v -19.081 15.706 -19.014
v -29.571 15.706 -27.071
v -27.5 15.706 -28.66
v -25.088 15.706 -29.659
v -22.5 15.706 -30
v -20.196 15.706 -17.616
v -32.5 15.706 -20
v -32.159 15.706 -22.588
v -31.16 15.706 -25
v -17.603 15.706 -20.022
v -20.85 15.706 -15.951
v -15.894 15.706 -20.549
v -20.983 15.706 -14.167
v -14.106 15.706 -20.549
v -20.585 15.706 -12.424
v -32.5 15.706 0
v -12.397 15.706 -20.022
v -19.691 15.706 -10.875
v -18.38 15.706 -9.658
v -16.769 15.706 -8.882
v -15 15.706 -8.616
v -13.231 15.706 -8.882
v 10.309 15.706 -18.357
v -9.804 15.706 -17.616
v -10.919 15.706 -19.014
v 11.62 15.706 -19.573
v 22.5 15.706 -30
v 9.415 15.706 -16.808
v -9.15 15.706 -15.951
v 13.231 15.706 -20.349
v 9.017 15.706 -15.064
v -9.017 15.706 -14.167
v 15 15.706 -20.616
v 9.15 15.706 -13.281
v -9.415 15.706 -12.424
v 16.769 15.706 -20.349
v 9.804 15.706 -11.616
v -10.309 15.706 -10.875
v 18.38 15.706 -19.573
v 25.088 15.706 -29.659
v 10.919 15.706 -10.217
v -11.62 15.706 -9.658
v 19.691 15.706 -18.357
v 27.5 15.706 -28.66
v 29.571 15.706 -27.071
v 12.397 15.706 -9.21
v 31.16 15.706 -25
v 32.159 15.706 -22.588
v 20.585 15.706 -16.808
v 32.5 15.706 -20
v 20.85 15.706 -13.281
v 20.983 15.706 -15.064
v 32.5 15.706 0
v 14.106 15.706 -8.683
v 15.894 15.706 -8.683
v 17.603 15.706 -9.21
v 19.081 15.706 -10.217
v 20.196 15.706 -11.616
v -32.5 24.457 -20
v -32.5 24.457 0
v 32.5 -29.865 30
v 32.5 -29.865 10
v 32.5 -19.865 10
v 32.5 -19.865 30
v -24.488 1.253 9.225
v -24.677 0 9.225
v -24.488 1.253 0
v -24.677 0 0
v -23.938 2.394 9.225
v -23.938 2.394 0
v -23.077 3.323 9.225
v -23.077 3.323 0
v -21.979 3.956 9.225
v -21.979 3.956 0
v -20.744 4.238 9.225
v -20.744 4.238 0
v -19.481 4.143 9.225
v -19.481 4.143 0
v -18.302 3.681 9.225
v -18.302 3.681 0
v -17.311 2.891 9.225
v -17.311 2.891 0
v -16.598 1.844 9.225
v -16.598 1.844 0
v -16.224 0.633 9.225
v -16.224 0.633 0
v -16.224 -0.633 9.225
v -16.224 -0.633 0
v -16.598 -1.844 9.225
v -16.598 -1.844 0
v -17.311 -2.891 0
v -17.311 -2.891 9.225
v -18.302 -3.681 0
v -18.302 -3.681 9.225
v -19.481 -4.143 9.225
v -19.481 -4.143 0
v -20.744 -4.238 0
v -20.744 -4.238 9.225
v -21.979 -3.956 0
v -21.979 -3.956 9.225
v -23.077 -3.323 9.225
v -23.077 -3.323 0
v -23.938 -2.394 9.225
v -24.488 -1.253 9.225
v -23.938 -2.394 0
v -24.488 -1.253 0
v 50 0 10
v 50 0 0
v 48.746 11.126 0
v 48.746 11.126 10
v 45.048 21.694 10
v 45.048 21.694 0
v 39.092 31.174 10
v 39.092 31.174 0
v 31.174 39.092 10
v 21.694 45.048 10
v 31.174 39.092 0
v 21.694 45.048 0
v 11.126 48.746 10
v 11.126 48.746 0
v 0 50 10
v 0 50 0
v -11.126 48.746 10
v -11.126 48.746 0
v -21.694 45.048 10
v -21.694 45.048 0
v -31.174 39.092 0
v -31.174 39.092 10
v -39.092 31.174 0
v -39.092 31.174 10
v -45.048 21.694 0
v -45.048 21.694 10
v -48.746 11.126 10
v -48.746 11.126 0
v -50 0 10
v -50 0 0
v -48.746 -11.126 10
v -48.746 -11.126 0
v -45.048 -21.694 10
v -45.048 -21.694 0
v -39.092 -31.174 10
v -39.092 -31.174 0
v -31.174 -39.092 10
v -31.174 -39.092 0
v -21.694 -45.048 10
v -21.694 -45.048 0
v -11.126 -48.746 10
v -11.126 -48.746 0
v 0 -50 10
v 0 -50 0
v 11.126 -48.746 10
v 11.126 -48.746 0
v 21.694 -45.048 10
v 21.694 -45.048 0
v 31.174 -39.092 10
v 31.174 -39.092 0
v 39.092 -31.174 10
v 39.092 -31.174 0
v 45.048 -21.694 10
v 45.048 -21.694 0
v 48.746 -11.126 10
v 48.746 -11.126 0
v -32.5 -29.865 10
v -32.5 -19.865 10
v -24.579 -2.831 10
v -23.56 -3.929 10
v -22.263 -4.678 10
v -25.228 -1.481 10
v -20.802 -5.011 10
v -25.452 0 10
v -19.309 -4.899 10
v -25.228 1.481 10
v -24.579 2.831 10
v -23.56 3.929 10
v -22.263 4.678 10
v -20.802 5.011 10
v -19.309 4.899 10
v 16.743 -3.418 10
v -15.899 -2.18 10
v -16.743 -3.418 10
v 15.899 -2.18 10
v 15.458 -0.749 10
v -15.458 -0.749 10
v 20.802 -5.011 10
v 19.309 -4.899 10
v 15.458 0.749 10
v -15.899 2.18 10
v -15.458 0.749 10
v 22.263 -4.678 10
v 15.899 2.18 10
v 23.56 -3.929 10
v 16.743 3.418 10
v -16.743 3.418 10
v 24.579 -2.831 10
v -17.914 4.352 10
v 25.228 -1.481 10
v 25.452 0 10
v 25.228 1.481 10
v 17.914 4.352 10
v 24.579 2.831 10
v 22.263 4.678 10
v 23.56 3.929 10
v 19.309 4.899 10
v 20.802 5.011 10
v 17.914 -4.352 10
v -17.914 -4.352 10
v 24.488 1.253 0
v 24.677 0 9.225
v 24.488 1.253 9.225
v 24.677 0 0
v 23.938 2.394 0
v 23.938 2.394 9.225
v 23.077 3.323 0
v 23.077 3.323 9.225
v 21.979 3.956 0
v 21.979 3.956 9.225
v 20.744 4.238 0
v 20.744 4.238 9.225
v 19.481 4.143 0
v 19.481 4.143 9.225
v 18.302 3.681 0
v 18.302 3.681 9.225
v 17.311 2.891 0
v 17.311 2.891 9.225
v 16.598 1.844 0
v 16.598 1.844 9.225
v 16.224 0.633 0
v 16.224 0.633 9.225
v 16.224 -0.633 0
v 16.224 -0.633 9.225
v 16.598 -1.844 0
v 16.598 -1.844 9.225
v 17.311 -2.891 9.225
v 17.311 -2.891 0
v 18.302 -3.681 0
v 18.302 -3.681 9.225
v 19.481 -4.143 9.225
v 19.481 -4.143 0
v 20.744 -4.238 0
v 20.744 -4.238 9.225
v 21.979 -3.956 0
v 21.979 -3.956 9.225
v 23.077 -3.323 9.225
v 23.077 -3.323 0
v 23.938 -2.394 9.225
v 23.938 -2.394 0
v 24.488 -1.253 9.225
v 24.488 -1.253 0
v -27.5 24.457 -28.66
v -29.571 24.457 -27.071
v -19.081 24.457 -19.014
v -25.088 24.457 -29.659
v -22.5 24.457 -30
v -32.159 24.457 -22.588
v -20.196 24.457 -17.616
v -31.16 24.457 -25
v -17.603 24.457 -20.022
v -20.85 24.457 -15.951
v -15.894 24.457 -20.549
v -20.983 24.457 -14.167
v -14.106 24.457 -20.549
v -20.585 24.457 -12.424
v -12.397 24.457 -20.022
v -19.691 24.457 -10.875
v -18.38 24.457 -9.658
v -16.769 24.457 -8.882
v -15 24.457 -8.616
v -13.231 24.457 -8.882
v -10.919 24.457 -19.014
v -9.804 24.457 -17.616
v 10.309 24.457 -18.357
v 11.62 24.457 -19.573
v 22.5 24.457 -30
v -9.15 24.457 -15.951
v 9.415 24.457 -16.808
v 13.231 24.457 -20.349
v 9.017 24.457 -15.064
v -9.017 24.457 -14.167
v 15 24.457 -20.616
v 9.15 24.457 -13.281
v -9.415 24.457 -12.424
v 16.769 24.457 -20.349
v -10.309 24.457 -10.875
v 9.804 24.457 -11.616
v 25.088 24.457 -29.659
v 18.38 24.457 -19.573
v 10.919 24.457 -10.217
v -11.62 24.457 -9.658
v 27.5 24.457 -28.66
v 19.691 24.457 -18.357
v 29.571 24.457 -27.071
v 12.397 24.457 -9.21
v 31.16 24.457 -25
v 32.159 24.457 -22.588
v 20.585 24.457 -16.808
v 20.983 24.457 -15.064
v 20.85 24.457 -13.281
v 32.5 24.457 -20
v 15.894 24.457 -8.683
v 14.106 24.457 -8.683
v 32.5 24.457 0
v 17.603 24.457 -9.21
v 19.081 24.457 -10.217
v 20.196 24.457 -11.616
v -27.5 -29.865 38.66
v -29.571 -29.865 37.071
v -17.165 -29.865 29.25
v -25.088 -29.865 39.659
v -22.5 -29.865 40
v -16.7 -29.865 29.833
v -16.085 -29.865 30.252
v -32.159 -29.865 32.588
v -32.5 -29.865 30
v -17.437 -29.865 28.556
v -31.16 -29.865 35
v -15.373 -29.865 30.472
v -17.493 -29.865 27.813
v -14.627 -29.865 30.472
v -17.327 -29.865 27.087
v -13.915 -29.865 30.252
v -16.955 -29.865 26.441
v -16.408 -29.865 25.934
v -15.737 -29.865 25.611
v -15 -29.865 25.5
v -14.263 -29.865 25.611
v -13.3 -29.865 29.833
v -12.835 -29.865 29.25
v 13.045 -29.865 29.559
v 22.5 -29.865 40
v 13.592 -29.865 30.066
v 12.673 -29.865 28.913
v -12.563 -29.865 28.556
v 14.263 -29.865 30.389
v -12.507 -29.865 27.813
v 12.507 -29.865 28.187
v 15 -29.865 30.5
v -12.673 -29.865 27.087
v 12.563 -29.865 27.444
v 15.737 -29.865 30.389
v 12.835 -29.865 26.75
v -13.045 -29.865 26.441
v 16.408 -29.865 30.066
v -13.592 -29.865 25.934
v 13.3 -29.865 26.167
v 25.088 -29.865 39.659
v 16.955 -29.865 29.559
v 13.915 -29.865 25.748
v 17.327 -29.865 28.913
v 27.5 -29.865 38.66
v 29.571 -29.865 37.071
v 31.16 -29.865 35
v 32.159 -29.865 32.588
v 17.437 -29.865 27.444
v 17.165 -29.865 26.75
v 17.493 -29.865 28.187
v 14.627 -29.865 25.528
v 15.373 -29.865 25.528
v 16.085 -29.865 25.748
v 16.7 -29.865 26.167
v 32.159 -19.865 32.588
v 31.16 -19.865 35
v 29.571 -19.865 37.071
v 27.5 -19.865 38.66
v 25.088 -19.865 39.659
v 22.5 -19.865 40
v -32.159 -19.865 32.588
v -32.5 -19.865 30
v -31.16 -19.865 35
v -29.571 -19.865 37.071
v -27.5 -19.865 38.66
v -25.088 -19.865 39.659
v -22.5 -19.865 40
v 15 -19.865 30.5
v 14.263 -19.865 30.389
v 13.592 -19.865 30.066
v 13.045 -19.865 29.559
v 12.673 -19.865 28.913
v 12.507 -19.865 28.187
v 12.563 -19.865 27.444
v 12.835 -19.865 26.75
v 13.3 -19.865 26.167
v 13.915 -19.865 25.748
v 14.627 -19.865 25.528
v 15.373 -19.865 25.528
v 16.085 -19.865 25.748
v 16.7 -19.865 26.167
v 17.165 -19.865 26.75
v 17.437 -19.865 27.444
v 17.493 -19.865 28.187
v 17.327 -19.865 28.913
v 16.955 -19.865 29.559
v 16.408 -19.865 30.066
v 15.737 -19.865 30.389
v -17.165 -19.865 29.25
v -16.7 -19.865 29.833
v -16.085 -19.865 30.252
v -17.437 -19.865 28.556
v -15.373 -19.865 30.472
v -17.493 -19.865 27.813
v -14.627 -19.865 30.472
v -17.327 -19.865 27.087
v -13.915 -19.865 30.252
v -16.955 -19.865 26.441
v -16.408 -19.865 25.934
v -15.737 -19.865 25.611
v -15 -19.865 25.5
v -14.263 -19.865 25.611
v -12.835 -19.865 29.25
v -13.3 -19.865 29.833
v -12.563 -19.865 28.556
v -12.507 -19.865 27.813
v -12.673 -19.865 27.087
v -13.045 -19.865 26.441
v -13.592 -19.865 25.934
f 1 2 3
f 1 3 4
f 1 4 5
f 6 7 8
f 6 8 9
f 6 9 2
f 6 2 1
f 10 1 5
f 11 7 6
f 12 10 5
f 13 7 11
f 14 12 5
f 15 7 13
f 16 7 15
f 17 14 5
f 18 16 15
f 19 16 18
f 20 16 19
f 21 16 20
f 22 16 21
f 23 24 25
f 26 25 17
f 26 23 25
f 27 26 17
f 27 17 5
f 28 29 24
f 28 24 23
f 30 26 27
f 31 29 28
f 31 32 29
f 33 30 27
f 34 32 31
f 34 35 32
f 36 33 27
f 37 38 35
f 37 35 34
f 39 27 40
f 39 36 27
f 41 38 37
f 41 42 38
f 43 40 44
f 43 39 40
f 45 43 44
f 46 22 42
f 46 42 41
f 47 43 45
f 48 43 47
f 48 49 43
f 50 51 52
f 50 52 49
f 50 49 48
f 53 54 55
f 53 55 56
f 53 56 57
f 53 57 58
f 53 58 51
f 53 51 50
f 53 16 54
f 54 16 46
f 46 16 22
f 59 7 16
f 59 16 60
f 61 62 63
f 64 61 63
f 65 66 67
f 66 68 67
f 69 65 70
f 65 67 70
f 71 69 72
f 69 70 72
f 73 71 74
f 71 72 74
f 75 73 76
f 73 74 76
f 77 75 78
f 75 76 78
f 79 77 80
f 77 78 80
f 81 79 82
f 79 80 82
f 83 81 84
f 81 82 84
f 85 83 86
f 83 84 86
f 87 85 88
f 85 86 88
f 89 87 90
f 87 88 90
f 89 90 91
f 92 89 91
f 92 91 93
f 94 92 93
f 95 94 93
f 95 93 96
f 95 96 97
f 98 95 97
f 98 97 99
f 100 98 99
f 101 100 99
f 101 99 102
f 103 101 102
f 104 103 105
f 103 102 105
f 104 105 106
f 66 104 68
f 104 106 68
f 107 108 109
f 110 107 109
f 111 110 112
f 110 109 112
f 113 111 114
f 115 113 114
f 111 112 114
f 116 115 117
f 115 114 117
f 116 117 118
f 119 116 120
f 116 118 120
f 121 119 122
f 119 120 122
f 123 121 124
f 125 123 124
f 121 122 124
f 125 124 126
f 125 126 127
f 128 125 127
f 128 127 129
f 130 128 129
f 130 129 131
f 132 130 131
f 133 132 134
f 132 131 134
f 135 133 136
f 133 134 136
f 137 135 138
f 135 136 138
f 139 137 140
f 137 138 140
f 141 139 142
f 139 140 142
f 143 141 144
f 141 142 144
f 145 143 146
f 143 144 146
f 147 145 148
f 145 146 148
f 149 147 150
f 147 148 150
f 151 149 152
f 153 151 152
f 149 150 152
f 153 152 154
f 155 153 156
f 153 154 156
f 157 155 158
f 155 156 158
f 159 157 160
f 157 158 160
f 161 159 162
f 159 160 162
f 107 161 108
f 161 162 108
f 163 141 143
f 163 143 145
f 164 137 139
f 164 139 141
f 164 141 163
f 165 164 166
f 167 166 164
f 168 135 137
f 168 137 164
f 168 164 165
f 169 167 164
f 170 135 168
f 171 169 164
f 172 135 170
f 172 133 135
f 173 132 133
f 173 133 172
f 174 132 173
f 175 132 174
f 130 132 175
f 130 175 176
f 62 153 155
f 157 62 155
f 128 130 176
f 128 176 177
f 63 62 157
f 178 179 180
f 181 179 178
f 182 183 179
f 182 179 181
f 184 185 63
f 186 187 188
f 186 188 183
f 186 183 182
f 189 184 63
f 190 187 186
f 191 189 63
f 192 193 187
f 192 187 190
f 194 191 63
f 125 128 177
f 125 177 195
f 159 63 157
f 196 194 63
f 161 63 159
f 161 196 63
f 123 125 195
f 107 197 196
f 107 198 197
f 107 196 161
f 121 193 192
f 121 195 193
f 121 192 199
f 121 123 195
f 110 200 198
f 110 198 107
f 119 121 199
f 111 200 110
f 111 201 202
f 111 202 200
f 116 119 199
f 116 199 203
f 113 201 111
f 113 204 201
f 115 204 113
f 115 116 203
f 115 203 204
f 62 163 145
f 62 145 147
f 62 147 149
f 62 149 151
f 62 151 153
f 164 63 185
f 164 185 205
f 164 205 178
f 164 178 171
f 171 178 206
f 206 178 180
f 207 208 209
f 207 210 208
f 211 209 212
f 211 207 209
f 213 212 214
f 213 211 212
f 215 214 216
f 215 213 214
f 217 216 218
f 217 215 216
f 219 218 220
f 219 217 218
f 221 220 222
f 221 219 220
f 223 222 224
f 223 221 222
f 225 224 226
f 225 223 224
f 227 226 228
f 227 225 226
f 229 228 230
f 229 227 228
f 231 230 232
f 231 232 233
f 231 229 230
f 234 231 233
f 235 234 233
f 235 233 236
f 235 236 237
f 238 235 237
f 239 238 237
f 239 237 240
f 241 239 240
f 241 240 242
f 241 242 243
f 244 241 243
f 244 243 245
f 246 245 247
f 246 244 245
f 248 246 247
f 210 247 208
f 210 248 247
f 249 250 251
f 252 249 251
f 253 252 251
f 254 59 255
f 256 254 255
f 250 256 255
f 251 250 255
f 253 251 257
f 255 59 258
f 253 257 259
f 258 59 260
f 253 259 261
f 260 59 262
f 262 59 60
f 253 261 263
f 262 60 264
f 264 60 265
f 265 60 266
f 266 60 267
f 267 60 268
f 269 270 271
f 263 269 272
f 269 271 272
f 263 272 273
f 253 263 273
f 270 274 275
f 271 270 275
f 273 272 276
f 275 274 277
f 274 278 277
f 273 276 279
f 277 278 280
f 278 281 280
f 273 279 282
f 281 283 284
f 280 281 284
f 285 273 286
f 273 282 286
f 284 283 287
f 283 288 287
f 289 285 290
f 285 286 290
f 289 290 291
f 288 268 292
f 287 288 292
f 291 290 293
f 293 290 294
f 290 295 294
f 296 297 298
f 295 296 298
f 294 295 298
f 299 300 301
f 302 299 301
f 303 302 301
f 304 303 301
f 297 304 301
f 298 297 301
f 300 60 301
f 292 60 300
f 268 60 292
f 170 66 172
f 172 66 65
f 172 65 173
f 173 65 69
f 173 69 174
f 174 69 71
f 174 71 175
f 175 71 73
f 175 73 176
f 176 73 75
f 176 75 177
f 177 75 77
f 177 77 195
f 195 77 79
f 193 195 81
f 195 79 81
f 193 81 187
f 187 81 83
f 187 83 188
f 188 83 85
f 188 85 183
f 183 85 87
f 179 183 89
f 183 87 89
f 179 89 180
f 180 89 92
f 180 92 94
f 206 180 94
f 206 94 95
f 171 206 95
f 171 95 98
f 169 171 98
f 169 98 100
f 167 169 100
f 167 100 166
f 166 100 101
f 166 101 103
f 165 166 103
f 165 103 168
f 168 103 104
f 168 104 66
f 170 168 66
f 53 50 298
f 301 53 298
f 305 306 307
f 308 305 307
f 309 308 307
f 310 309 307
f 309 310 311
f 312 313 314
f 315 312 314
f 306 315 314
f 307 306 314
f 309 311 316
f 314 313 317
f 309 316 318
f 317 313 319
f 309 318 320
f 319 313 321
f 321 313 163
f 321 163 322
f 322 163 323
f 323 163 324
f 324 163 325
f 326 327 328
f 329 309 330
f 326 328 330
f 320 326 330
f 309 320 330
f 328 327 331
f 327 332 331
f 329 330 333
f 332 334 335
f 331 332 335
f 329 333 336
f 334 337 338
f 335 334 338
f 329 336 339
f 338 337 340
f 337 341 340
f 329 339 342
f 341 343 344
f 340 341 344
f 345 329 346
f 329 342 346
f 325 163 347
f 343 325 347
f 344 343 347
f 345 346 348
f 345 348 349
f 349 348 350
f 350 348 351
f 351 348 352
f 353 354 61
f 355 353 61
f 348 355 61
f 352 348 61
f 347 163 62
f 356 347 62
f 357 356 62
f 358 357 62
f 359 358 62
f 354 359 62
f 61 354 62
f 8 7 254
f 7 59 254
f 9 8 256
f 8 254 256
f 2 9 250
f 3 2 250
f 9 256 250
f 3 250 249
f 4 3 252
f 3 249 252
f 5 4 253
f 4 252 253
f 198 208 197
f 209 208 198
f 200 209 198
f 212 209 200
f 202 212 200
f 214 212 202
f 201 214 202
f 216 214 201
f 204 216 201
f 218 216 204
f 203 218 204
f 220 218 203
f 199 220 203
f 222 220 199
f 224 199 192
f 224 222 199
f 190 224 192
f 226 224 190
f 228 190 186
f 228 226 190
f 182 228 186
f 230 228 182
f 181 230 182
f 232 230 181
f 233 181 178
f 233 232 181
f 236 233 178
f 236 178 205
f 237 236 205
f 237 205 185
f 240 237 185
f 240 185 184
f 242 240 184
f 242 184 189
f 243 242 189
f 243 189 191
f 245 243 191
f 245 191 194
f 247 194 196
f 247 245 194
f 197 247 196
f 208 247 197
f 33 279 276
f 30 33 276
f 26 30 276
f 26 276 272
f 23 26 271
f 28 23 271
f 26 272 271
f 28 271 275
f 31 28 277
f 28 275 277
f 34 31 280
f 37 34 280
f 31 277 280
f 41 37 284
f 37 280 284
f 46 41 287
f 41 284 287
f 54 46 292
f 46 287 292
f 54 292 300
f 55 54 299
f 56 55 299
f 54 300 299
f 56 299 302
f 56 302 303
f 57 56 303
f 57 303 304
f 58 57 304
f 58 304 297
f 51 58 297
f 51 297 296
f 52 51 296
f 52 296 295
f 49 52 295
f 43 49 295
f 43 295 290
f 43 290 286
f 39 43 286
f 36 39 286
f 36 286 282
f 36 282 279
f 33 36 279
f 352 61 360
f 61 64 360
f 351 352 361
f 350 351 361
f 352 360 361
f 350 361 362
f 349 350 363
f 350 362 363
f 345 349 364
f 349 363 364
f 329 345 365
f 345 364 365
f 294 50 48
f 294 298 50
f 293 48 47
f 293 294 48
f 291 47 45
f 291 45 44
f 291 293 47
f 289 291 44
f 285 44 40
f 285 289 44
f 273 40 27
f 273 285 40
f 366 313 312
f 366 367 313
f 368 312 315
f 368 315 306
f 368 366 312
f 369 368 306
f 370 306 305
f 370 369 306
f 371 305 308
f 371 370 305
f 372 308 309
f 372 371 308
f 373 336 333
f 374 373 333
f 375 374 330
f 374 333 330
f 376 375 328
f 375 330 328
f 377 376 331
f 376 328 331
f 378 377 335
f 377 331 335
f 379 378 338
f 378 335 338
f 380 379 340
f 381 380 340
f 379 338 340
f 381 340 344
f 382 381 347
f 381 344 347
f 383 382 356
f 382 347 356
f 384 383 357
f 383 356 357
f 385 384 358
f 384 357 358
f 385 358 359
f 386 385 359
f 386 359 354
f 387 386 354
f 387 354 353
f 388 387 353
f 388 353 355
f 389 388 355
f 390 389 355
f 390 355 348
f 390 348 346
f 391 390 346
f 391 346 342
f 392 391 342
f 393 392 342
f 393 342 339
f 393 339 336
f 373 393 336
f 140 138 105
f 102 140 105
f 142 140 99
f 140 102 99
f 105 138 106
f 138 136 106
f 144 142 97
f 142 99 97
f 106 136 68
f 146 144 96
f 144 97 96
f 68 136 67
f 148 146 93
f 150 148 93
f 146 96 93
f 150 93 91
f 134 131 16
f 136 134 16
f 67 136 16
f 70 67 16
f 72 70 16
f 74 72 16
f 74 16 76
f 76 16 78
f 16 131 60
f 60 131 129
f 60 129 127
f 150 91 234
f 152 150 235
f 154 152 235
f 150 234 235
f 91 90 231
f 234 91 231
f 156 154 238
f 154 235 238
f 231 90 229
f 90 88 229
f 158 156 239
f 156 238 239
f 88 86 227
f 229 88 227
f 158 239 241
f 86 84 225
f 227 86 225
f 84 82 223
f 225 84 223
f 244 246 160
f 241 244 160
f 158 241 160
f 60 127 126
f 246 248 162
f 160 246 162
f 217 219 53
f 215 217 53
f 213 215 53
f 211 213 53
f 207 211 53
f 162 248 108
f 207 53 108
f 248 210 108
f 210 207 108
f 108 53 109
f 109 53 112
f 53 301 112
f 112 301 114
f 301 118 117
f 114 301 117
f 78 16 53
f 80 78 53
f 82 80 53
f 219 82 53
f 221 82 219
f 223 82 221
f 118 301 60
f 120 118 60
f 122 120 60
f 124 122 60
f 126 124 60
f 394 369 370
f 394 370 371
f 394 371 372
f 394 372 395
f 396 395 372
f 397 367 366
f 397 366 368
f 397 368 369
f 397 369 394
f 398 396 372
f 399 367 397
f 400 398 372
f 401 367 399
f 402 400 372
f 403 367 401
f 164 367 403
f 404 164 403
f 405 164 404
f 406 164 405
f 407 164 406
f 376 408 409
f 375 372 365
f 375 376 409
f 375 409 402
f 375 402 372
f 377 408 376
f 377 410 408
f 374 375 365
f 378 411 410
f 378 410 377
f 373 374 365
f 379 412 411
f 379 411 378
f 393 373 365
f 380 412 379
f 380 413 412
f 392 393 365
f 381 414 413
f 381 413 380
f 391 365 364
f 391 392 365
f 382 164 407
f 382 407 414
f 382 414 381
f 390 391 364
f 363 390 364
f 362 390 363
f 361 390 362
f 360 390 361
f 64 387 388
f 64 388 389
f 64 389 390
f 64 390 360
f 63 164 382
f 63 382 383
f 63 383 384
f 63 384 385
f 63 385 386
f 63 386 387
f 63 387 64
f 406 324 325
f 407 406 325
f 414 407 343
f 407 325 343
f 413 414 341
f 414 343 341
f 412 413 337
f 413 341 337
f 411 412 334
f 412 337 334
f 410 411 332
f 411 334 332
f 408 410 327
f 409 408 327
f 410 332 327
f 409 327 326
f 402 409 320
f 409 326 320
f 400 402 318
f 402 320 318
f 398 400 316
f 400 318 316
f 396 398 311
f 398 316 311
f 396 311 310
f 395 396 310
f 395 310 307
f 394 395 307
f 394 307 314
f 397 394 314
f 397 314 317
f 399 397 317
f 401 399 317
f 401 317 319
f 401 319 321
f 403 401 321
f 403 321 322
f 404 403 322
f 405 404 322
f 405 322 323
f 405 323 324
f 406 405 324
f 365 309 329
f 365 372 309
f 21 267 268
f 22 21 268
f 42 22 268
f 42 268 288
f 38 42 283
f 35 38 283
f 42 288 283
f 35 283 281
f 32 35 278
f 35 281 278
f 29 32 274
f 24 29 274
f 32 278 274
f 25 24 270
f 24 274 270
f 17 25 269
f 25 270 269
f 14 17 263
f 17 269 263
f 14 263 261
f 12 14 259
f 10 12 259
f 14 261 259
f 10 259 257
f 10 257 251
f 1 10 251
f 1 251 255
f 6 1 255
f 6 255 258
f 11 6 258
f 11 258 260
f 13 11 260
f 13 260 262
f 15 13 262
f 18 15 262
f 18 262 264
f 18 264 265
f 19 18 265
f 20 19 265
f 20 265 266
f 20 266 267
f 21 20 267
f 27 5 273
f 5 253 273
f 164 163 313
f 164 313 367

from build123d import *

# Parameters (mm, degrees)
SKETCH_1_R                    = 50
EXTRUDE_1_DEPTH               = 10
HOLE_WIZARD_M10_1_D           = 8.5
HOLE_WIZARD_M10_1_CSINK_D     = 10.05
HOLE_WIZARD_M10_1_CSINK_ANGLE = 90
SKETCH_16_W                   = 65
SKETCH_16_H                   = 10
EXTRUDE_2_DEPTH               = 30
SKETCH_18_W                   = 65
SKETCH_18_H                   = 8.750492466
EXTRUDE_3_DEPTH               = 40
FILLET_2_R                    = 10
FILLET_3_R                    = 10
CUT_EXTRUDE_1_REACH           = 104.364
SKETCH_20_R                   = 2.5
CUT_EXTRUDE_2_REACH           = 100.203
SKETCH_22_R                   = 6


with BuildPart() as part:
    # 草图1 → 凸台-拉伸1 (new body)
    with BuildSketch(Plane.XY):
        Circle(SKETCH_1_R)
    extrude(amount=EXTRUDE_1_DEPTH)

    # M10 螺纹孔1 (through all)
    with Locations(Plane.XY.offset(10)):
        with Locations((-20.426671729, 0)):
            hole_wizard_m10_1 = CounterSinkHole(HOLE_WIZARD_M10_1_D / 2, HOLE_WIZARD_M10_1_CSINK_D / 2, counter_sink_angle=HOLE_WIZARD_M10_1_CSINK_ANGLE)

    # 镜向2: M10 螺纹孔1 across plane
    add(hole_wizard_m10_1.mirror(Plane(origin=(0, 0, 0), x_dir=(0, 0, 1), z_dir=(1, 0, 0))), mode=Mode.SUBTRACT)

    # 草图16 → 凸台-拉伸2 (add)
    with BuildSketch(Plane.XY.offset(10)):
        with Locations((0, -24.864937428)):
            Rectangle(SKETCH_16_W, SKETCH_16_H)
    extrude(amount=EXTRUDE_2_DEPTH)

    # 草图18 → 凸台-拉伸3 (add)
    with BuildSketch(Plane.XY.offset(10)):
        with Locations((0, 20.081420938)):
            Rectangle(SKETCH_18_W, SKETCH_18_H)
    extrude(amount=-EXTRUDE_3_DEPTH)

    # 圆角2
    fillet_2_edges = [part.edges().sort_by_distance(p)[0] for p in [
        (-32.5, -24.864937428, 40),
        (32.5, -24.864937428, 40),
    ]]
    fillet(fillet_2_edges, radius=FILLET_2_R)

    # 圆角3
    fillet_3_edges = [part.edges().sort_by_distance(p)[0] for p in [
        (32.5, 20.081420938, -30),
        (-32.5, 20.081420938, -30),
    ]]
    fillet(fillet_3_edges, radius=FILLET_3_R)

    # 草图20 → 切除-拉伸1 (cut, up to next)
    with BuildSketch(Plane.XZ.offset(29.864937428), mode=Mode.PRIVATE) as cut_extrude_1_sk1:
        with Locations(Location((-15, 28, 0), (0, 0, 270))):
            Circle(SKETCH_20_R)
    cut_extrude_1_tool1 = extrude(cut_extrude_1_sk1.sketch, amount=-CUT_EXTRUDE_1_REACH, mode=Mode.PRIVATE) & part.part
    # 草图20 → 切除-拉伸1 (cut, up to next)
    with BuildSketch(Plane.XZ.offset(29.864937428), mode=Mode.PRIVATE) as cut_extrude_1_sk2:
        with Locations(Location((15, 28, 0), (0, 0, 90))):
            Circle(SKETCH_20_R)
    cut_extrude_1_tool2 = extrude(cut_extrude_1_sk2.sketch, amount=-CUT_EXTRUDE_1_REACH, mode=Mode.PRIVATE) & part.part
    add(cut_extrude_1_tool1.solids().sort_by_distance((-15, -29.864937, 28))[0], mode=Mode.SUBTRACT)
    add(cut_extrude_1_tool2.solids().sort_by_distance((15, -29.864937, 28))[0], mode=Mode.SUBTRACT)

    # 草图22 → 切除-拉伸2 (cut, up to next)
    with BuildSketch(Plane(origin=(0, 24.456667171, 0), x_dir=(1, 0, 0), z_dir=(0, 1, 0)), mode=Mode.PRIVATE) as cut_extrude_2_sk1:
        with Locations(Location((-15, 14.615729017, 0), (0, 0, 270))):
            Circle(SKETCH_22_R)
    cut_extrude_2_tool1 = extrude(cut_extrude_2_sk1.sketch, amount=-CUT_EXTRUDE_2_REACH, mode=Mode.PRIVATE) & part.part
    # 草图22 → 切除-拉伸2 (cut, up to next)
    with BuildSketch(Plane(origin=(0, 24.456667171, 0), x_dir=(1, 0, 0), z_dir=(0, 1, 0)), mode=Mode.PRIVATE) as cut_extrude_2_sk2:
        with Locations(Location((15, 14.615729017, 0), (0, 0, 90))):
            Circle(SKETCH_22_R)
    cut_extrude_2_tool2 = extrude(cut_extrude_2_sk2.sketch, amount=-CUT_EXTRUDE_2_REACH, mode=Mode.PRIVATE) & part.part
    add(cut_extrude_2_tool1.solids().sort_by_distance((-15, 24.456667, -14.615729))[0], mode=Mode.SUBTRACT)
    add(cut_extrude_2_tool2.solids().sort_by_distance((15, 24.456667, -14.615729))[0], mode=Mode.SUBTRACT)


solid = part.part
